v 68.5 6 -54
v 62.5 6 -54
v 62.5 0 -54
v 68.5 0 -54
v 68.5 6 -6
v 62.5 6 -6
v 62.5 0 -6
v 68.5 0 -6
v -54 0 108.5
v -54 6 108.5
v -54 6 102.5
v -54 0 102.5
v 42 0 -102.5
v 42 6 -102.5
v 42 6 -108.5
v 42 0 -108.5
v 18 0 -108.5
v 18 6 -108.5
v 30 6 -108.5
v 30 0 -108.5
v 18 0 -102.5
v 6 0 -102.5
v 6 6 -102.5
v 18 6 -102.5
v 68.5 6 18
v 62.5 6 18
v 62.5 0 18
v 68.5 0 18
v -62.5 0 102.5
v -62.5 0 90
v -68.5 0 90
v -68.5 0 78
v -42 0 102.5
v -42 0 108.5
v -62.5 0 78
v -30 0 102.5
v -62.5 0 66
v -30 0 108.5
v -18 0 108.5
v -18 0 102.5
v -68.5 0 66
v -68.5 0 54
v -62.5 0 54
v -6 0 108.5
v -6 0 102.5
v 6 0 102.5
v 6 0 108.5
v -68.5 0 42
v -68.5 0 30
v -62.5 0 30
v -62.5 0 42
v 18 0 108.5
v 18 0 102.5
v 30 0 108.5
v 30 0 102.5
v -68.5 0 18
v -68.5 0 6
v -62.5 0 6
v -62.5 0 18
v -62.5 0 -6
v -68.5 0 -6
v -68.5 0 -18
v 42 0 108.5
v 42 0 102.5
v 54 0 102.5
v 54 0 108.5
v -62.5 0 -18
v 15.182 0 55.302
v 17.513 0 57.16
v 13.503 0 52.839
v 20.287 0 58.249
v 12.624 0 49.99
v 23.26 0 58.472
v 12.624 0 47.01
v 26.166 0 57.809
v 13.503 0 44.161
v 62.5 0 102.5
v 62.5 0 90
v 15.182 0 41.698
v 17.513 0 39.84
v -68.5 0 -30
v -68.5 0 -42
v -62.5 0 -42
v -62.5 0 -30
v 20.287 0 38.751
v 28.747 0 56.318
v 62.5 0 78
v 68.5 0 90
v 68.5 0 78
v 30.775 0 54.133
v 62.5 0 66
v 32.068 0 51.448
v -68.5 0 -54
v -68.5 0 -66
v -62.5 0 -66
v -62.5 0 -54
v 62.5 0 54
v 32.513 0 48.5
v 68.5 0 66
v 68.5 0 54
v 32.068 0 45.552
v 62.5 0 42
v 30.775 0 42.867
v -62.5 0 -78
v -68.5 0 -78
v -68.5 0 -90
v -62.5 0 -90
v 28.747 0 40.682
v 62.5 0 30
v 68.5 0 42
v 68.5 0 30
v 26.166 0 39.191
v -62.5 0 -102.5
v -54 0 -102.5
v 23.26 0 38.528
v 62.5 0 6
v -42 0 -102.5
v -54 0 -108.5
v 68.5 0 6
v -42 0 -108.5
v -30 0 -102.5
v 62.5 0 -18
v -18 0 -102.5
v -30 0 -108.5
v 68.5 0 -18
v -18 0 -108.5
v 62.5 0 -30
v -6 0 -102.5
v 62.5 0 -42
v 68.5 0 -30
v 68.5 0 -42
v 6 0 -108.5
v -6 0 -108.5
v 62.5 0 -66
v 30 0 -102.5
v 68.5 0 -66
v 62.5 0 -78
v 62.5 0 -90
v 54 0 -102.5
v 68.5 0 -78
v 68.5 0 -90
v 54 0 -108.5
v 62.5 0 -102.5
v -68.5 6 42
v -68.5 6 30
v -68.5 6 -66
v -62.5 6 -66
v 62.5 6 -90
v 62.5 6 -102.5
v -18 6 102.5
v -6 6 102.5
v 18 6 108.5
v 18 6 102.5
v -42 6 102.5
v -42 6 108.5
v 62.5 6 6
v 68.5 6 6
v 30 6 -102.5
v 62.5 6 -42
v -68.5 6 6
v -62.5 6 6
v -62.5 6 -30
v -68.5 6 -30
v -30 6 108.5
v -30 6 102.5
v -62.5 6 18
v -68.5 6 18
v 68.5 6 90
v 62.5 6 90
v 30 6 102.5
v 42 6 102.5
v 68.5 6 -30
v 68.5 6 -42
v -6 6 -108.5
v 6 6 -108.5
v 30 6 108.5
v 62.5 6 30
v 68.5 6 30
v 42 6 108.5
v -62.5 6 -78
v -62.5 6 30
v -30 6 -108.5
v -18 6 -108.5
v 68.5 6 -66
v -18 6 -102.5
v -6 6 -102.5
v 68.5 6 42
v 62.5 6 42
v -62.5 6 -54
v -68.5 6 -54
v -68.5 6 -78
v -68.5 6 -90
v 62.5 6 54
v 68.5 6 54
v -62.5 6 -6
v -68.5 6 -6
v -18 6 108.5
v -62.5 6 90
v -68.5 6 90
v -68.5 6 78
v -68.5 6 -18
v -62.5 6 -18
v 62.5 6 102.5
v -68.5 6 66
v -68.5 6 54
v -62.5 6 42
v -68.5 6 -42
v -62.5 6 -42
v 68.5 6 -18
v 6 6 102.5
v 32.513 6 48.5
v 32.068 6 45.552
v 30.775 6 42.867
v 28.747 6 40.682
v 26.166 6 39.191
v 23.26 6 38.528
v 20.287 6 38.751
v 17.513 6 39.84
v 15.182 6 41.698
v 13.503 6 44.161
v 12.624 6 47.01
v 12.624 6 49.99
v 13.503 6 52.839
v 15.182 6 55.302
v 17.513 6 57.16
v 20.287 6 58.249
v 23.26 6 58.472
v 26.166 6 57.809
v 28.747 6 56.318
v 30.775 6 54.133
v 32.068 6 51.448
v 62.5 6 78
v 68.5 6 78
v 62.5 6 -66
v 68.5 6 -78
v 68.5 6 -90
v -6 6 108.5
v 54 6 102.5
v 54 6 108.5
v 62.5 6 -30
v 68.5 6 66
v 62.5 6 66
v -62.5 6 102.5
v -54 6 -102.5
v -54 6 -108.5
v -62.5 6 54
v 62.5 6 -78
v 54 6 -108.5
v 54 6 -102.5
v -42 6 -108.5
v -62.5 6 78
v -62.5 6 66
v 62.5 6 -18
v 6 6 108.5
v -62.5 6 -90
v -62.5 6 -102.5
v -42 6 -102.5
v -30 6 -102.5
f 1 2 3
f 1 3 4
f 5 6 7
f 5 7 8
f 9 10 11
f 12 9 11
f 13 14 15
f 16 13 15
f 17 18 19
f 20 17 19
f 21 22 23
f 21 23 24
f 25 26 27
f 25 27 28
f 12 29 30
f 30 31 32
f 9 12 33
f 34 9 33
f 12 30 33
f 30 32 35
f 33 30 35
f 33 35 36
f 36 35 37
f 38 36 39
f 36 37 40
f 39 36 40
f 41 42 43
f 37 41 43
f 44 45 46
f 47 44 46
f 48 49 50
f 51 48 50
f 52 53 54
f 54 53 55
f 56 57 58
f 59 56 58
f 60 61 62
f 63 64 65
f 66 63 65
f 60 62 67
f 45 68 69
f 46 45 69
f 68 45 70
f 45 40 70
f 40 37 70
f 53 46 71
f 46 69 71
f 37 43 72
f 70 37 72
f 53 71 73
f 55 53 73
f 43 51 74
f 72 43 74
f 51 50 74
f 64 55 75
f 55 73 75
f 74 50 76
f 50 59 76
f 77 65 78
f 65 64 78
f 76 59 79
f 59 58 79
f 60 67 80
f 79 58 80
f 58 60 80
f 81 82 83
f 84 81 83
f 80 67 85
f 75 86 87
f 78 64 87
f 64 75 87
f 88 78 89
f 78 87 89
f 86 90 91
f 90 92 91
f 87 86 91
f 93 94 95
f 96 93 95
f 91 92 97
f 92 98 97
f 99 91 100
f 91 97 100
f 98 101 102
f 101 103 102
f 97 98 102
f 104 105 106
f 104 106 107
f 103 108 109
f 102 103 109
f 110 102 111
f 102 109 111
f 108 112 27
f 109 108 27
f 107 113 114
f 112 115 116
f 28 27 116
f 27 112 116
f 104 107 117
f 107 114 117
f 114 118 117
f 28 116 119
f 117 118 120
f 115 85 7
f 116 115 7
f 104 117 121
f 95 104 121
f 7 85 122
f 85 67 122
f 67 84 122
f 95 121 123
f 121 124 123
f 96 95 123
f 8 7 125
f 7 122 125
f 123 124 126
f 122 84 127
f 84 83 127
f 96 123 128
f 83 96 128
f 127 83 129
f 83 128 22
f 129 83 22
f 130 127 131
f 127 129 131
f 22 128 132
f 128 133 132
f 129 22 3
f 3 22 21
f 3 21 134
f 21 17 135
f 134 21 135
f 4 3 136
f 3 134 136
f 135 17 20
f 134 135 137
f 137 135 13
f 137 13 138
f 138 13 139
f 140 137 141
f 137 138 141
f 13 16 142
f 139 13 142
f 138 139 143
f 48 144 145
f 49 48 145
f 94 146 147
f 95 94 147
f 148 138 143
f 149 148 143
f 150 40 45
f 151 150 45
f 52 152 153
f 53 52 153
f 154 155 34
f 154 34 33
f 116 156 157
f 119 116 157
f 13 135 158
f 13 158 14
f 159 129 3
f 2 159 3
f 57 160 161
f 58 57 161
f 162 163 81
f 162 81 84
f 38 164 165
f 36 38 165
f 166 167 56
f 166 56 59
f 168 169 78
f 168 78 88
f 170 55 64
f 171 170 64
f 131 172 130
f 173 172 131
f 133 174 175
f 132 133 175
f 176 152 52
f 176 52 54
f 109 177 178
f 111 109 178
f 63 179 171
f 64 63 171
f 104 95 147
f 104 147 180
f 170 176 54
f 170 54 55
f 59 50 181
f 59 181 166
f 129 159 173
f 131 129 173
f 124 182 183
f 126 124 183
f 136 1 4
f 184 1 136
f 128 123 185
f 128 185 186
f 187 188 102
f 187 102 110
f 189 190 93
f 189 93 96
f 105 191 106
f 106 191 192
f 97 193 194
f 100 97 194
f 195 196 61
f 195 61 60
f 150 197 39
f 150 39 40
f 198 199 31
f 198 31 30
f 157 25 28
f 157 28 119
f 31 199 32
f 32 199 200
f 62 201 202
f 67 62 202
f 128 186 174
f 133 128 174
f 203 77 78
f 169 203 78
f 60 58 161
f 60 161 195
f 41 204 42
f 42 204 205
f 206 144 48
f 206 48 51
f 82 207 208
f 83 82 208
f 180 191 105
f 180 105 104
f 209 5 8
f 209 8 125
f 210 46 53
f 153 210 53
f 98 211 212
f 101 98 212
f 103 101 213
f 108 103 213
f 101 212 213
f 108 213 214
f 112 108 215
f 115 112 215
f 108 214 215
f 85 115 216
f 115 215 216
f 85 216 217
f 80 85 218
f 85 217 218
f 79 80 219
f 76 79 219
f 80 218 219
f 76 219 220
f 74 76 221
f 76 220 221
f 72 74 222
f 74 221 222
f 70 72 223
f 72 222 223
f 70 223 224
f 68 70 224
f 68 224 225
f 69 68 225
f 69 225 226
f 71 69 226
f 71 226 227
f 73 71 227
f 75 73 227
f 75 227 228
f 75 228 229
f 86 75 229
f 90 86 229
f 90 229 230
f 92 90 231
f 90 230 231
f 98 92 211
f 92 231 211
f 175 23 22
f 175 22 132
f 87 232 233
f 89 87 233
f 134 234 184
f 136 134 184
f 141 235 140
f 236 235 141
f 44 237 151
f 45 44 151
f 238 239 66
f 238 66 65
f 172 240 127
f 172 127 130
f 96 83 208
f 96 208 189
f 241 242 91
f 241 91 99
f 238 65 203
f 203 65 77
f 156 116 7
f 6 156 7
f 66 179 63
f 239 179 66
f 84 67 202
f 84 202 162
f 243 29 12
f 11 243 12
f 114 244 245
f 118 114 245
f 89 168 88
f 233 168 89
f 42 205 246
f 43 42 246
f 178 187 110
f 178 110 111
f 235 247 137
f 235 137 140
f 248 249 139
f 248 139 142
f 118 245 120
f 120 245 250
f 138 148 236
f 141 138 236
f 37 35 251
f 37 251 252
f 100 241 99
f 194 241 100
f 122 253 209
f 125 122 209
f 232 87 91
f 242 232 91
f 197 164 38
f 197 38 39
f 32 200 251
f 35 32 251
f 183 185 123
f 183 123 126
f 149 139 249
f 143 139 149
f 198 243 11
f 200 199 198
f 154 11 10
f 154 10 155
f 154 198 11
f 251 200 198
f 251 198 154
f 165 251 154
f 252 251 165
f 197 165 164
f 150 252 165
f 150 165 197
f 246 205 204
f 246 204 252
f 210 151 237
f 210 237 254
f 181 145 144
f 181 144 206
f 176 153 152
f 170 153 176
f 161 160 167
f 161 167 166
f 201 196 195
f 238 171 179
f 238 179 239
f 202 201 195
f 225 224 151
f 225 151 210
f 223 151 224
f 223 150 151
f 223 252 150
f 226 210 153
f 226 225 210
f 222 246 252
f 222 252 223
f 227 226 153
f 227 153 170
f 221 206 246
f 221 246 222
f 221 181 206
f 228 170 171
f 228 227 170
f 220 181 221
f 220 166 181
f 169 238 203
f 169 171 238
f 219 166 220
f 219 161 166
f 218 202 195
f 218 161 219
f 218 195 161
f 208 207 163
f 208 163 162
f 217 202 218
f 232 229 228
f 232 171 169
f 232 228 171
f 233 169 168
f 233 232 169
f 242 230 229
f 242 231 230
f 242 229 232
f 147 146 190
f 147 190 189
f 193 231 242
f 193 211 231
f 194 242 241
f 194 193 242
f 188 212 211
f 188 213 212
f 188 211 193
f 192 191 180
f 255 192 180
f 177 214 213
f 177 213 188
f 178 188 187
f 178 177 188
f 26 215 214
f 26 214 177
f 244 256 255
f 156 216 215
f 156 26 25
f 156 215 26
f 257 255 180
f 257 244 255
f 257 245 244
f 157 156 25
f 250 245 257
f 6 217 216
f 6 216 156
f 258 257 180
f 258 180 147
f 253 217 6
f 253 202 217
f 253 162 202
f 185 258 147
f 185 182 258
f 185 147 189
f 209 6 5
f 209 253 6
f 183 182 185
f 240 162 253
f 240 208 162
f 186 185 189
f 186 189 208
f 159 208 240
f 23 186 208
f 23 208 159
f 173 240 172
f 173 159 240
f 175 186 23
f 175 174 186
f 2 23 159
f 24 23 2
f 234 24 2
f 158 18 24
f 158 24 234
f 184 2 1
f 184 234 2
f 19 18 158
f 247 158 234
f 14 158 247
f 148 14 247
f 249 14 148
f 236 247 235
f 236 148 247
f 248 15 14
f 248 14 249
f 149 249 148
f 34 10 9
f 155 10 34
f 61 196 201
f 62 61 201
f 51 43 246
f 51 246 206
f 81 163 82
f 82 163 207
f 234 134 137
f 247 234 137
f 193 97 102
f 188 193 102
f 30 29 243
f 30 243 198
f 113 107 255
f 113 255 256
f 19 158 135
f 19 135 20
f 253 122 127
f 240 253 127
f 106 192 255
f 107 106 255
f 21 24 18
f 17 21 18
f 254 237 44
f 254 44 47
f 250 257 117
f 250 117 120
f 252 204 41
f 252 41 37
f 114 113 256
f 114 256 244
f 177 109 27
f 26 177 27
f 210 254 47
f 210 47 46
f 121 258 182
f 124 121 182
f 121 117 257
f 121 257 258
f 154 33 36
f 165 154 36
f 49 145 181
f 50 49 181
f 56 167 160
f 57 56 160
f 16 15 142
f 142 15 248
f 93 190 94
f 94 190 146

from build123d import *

# Parameters (mm, degrees)
SKETCH3_W           = 125
SKETCH3_H           = 205
BOSS_EXTRUDE1_DEPTH = 6
SKETCH5_W           = 12
SKETCH5_H           = 6
SKETCH5_W_2         = 6
SKETCH5_H_2         = 12
BOSS_EXTRUDE2_DEPTH = 6
SKETCH6_R           = 10
CUT_EXTRUDE1_DEPTH  = 6


with BuildPart() as part:
    # Sketch3 → Boss-Extrude1 (new body)
    with BuildSketch(Plane(origin=(0, 0, 0), x_dir=(1, 0, 0), z_dir=(0, 1, 0))):
        Rectangle(SKETCH3_W, SKETCH3_H)
    extrude(amount=BOSS_EXTRUDE1_DEPTH)

    # Sketch5 → Boss-Extrude2 (add)
    with BuildSketch(Plane(origin=(0, 6, 0), x_dir=(1, 0, 0), z_dir=(0, 1, 0))):
        with Locations((24, -105.5)):
            Rectangle(SKETCH5_W, SKETCH5_H)
        with Locations((0, -105.5)):
            Rectangle(SKETCH5_W, SKETCH5_H)
        with Locations((-65.5, -84)):
            Rectangle(SKETCH5_W_2, SKETCH5_H_2)
        with Locations((-65.5, -60)):
            Rectangle(SKETCH5_W_2, SKETCH5_H_2)
        with Locations((-65.5, -12)):
            Rectangle(SKETCH5_W_2, SKETCH5_H_2)
        with Locations((65.5, -84)):
            Rectangle(SKETCH5_W_2, SKETCH5_H_2)
        with Locations((65.5, -36)):
            Rectangle(SKETCH5_W_2, SKETCH5_H_2)
        with Locations((65.5, -12)):
            Rectangle(SKETCH5_W_2, SKETCH5_H_2)
        with Locations((65.5, 12)):
            Rectangle(SKETCH5_W_2, SKETCH5_H_2)
        with Locations((65.5, 36)):
            Rectangle(SKETCH5_W_2, SKETCH5_H_2)
        with Locations((65.5, 84)):
            Rectangle(SKETCH5_W_2, SKETCH5_H_2)
        with Locations((24, 105.5)):
            Rectangle(SKETCH5_W, SKETCH5_H)
        with Locations((0, 105.5)):
            Rectangle(SKETCH5_W, SKETCH5_H)
        with Locations((-24, 105.5)):
            Rectangle(SKETCH5_W, SKETCH5_H)
        with Locations((-48, 105.5)):
            Rectangle(SKETCH5_W, SKETCH5_H)
        with Locations((-65.5, 36)):
            Rectangle(SKETCH5_W_2, SKETCH5_H_2)
        with Locations((-65.5, 12)):
            Rectangle(SKETCH5_W_2, SKETCH5_H_2)
        with Locations((48, -105.5)):
            Rectangle(SKETCH5_W, SKETCH5_H)
        with Locations((-24, -105.5)):
            Rectangle(SKETCH5_W, SKETCH5_H)
        with Locations((-48, -105.5)):
            Rectangle(SKETCH5_W, SKETCH5_H)
        with Locations((-65.5, -36)):
            Rectangle(SKETCH5_W_2, SKETCH5_H_2)
        with Locations((65.5, -60)):
            Rectangle(SKETCH5_W_2, SKETCH5_H_2)
        with Locations((65.5, 60)):
            Rectangle(SKETCH5_W_2, SKETCH5_H_2)
        with Locations((48, 105.5)):
            Rectangle(SKETCH5_W, SKETCH5_H)
        with Locations((-65.5, 84)):
            Rectangle(SKETCH5_W_2, SKETCH5_H_2)
        with Locations((-65.5, 60)):
            Rectangle(SKETCH5_W_2, SKETCH5_H_2)
    extrude(amount=-BOSS_EXTRUDE2_DEPTH)

    # Sketch6 → Cut-Extrude1 (cut)
    with BuildSketch(Plane(origin=(0, 6, 0), x_dir=(1, 0, 0), z_dir=(0, 1, 0))):
        with Locations((22.512507822, -48.5)):
            Circle(SKETCH6_R)
    extrude(amount=-CUT_EXTRUDE1_DEPTH, mode=Mode.SUBTRACT)


solid = part.part
